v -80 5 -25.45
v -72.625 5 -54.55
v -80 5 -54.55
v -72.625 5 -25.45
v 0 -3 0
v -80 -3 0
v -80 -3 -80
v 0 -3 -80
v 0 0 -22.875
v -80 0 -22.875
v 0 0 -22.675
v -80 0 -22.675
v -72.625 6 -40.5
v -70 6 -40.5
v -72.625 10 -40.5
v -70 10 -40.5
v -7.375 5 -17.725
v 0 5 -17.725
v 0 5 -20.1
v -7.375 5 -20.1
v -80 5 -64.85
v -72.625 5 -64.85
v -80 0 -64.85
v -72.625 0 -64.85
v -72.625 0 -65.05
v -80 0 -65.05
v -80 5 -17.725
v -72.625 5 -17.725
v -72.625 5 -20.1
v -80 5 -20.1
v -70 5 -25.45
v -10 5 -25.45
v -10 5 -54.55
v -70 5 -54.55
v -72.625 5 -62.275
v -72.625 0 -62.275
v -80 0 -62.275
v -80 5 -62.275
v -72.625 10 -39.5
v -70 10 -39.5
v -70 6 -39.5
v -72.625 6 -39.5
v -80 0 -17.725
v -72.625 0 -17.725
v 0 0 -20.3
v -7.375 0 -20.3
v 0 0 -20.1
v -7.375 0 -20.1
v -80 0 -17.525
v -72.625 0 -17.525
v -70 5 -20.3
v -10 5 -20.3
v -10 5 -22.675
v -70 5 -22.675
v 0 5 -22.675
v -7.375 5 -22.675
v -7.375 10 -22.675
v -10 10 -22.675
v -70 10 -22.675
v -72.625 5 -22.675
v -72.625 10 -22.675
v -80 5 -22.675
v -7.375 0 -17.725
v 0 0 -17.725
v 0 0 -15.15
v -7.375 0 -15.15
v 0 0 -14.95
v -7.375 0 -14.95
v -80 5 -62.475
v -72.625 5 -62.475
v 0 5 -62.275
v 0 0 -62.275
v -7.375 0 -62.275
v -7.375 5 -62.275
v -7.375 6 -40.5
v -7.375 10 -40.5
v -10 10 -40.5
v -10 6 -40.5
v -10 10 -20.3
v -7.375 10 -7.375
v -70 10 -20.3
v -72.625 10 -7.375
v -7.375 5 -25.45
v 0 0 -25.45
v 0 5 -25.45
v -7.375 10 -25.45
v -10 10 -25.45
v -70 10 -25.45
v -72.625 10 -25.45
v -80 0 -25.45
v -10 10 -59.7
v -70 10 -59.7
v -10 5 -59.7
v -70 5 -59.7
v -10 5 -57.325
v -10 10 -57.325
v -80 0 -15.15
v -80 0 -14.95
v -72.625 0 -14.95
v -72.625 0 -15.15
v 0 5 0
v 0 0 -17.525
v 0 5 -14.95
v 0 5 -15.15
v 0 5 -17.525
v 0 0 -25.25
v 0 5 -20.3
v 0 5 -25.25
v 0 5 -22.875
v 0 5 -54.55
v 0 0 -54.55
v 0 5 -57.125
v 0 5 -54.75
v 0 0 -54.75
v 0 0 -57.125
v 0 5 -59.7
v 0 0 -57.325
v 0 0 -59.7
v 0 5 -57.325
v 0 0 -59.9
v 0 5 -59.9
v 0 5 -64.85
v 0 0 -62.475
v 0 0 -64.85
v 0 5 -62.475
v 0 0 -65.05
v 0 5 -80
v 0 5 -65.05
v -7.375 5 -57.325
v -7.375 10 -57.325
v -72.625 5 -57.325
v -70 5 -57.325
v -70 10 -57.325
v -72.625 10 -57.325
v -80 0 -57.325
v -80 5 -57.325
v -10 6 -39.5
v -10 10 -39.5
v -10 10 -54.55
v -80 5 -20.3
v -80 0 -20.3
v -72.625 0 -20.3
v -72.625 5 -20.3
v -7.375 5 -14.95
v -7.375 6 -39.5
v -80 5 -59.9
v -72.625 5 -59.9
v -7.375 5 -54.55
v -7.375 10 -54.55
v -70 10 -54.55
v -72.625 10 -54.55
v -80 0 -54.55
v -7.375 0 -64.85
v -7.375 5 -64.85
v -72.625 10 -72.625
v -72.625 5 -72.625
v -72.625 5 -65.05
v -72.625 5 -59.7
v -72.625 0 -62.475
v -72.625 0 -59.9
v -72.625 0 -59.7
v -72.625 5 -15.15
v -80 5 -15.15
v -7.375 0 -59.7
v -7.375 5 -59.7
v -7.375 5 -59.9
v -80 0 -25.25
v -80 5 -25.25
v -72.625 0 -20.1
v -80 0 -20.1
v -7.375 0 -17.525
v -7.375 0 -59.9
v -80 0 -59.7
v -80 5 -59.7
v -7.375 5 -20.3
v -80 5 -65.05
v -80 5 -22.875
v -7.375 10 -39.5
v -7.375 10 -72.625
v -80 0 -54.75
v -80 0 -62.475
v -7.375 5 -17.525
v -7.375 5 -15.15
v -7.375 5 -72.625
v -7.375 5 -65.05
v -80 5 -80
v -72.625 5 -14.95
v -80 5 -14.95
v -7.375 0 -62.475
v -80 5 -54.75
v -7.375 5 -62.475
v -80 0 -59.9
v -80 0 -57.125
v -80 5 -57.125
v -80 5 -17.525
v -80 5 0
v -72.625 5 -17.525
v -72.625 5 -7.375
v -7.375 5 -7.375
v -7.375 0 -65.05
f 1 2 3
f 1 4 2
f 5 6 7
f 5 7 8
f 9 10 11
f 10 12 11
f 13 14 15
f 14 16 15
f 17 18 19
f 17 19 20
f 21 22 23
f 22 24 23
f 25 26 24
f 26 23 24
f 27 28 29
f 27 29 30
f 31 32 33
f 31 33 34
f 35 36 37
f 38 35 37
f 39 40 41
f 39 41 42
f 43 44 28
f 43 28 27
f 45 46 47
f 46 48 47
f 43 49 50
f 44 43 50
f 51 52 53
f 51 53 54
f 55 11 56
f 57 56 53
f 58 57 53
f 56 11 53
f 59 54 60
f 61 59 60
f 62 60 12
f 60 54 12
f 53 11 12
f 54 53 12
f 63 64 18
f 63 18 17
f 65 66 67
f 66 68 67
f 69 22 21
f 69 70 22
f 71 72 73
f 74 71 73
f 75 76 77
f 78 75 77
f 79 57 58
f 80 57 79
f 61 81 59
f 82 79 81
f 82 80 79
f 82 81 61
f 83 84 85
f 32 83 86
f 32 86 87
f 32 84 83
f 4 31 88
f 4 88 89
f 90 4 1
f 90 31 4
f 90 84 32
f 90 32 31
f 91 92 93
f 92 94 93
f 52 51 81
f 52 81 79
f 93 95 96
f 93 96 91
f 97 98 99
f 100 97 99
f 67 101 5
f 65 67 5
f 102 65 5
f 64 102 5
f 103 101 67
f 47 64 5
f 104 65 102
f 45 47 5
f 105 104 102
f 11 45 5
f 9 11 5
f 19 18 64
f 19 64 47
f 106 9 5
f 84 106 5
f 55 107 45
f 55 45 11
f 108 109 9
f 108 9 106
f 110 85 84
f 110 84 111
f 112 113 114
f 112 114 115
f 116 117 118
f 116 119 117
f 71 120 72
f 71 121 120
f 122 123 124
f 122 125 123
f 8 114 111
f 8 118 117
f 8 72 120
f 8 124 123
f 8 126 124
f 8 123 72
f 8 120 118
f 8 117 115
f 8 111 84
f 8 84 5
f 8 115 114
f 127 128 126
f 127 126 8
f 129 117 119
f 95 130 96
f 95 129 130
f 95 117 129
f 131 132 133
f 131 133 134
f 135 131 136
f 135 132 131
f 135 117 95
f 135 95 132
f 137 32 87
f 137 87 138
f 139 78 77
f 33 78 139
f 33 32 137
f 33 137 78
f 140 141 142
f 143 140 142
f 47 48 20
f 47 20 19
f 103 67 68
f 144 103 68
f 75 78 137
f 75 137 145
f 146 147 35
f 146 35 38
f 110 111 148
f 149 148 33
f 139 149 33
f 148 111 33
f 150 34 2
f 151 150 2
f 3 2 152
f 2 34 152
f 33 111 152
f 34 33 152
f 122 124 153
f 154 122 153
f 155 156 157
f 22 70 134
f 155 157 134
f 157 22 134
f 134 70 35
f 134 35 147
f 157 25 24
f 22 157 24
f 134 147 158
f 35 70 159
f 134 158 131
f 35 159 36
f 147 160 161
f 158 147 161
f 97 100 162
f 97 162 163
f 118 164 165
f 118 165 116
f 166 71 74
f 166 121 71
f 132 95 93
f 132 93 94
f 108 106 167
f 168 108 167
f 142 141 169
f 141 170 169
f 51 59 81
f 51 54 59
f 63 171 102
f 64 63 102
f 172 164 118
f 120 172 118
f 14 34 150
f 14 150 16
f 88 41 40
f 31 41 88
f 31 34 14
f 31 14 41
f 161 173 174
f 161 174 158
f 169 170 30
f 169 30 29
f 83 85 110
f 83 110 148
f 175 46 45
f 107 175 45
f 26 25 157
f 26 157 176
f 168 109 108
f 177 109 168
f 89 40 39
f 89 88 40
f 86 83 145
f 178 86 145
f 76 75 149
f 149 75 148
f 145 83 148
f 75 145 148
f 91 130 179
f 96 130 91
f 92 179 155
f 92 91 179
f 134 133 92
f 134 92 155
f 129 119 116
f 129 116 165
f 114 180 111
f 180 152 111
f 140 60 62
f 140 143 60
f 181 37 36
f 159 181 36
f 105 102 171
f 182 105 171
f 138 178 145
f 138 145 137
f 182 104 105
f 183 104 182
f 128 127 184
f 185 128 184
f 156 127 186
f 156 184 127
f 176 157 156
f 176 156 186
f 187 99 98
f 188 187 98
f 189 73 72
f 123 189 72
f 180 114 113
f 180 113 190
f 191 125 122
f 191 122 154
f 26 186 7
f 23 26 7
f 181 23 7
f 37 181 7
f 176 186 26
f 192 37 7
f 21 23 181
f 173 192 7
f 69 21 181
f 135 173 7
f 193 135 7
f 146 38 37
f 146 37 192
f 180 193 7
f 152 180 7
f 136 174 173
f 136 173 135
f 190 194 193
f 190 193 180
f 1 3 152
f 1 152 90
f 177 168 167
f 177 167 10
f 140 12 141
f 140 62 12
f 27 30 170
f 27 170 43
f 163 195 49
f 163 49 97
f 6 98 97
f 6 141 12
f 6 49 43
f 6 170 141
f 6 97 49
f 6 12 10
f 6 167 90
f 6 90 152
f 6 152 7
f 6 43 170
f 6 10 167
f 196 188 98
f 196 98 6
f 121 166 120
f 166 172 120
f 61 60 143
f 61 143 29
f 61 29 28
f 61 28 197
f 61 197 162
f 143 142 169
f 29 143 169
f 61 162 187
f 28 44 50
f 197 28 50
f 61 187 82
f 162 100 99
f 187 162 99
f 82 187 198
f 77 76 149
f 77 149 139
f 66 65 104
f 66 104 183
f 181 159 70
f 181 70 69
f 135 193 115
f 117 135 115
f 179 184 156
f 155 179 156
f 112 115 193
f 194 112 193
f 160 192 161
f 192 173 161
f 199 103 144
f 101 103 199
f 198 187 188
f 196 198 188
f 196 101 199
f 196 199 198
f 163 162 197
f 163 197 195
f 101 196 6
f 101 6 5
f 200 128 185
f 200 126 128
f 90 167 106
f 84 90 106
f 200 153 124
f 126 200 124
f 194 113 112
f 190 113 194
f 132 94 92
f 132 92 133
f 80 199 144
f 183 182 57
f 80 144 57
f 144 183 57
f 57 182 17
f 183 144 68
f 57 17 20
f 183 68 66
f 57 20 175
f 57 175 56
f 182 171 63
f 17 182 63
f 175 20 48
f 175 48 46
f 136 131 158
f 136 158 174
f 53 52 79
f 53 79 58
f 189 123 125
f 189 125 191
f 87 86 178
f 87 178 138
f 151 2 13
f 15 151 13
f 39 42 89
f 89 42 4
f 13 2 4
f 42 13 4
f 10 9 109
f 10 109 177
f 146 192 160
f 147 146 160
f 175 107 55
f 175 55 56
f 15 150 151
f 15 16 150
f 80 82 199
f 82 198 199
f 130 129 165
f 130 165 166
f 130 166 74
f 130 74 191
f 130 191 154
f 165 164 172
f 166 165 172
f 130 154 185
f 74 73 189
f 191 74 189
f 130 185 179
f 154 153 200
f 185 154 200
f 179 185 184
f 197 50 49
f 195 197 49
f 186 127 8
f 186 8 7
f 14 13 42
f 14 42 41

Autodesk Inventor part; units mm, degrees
ref_plane "YZ Plane" through (0, 0, 0) normal (1, 0, 0) x (0, 1, 0)
ref_plane "XZ Plane" through (0, 0, 0) normal (0, 1, 0) x (-1, 0, 0)
ref_plane "XY Plane" through (0, 0, 0) normal (0, 0, 1) x (1, 0, 0)
sketch "Boceto1" plane through (0, 0, 0) normal (0, 1, 0) x (-1, 0, 0)
  line L0 (0, 0) -> (80, 0)
  line L1 (80, 0) -> (80, -80)
  line L2 (80, -80) -> (0, -80)
  line L3 (0, -80) -> (0, 0)
  line L4 (10, -70) -> (70, -70)
  line L5 (70, -70) -> (70, -10)
  line L6 (70, -10) -> (10, -10)
  line L7 (10, -10) -> (10, -70)
  line L8 (0, -12.375) -> (80, -12.375)
  line L9 (0, -14.95) -> (80, -14.95)
  line L10 (0, -17.525) -> (80, -17.525)
  line L11 (80, -20.1) -> (0, -20.1)
  line L12 (0, -22.675) -> (80, -22.675)
  line L13 (0, -12.575) -> (80, -12.575)
  line L14 (0, -15.15) -> (80, -15.15)
  line L15 (0, -17.725) -> (80, -17.725)
  line L16 (80, -20.3) -> (0, -20.3)
  line L17 (0, -22.875) -> (80, -22.875)
  line L18 (0, -25.25) -> (80, -25.25)
  line L19 (0, -25.45) -> (80, -25.45)
  line L20 (10, -40) -> (80, -40)
  line L21 (0, -67.625) -> (80, -67.625)
  line L22 (0, -65.05) -> (80, -65.05)
  line L23 (0, -62.475) -> (80, -62.475)
  line L24 (80, -59.9) -> (0, -59.9)
  line L25 (0, -57.325) -> (80, -57.325)
  line L26 (0, -67.425) -> (80, -67.425)
  line L27 (0, -64.85) -> (80, -64.85)
  line L28 (0, -62.275) -> (80, -62.275)
  line L29 (80, -59.7) -> (0, -59.7)
  line L30 (0, -57.125) -> (80, -57.125)
  line L31 (0, -54.75) -> (80, -54.75)
  line L32 (0, -54.55) -> (80, -54.55)
  line L33 (72.625, -7.375) -> (7.375, -7.375)
  line L34 (7.375, -7.375) -> (7.375, -72.625)
  line L35 (7.375, -72.625) -> (72.625, -72.625)
  line L36 (72.625, -72.625) -> (72.625, -7.375)
  line L37 (7.375, 0) -> (0, 0)
  line L38 (7.375, -80) -> (0, -80)
  point P0 (10, -12.375)
  point P1 (70, -12.375)
  point P2 (10, -14.95)
  point P3 (70, -14.95)
  point P4 (10, -17.525)
  point P5 (70, -17.525)
  point P6 (70, -20.1)
  point P7 (10, -20.1)
  point P8 (10, -22.675)
  point P9 (70, -22.675)
  point P10 (10, -12.575)
  point P11 (70, -12.575)
  point P12 (10, -15.15)
  point P13 (70, -15.15)
  point P14 (10, -17.725)
  point P15 (70, -17.725)
  point P16 (70, -20.3)
  point P17 (10, -20.3)
  point P18 (10, -22.875)
  point P19 (70, -22.875)
  point P20 (10, -25.25)
  point P21 (70, -25.25)
  point P22 (10, -25.45)
  point P23 (70, -25.45)
  point P24 (10, -67.625)
  point P25 (70, -67.625)
  point P26 (10, -65.05)
  point P27 (70, -65.05)
  point P28 (10, -62.475)
  point P29 (70, -62.475)
  point P30 (70, -59.9)
  point P31 (10, -59.9)
  point P32 (10, -57.325)
  point P33 (70, -57.325)
  point P34 (10, -67.425)
  point P35 (70, -67.425)
  point P36 (10, -64.85)
  point P37 (70, -64.85)
  point P38 (10, -62.275)
  point P39 (70, -62.275)
  point P40 (70, -59.7)
  point P41 (10, -59.7)
  point P42 (10, -57.125)
  point P43 (70, -57.125)
  point P44 (10, -54.75)
  point P45 (70, -54.75)
  point P46 (10, -54.55)
  point P47 (70, -54.55)
  point P48 (72.625, -12.375)
  point P49 (7.375, -12.375)
  point P50 (72.625, -54.55)
  point P51 (72.625, -25.45)
  point P52 (70, -25.45)
  point P53 (70, -54.55)
  point P54 (7.375, -25.45)
  point P55 (7.375, -54.55)
  point P56 (10, -54.55)
  point P57 (10, -25.45)
  point P58 (10, -67.625)
  point P59 (7.375, -67.625)
  point P60 (72.625, -67.625)
  point P61 (70, -67.625)
  point P62 (7.375, -14.95)
  point P63 (72.625, -14.95)
  point P64 (72.625, -65.05)
  point P65 (70, -65.05)
  point P66 (10, -65.05)
  point P67 (7.375, -65.05)
  point P68 (70, -67.425)
  point P69 (10, -67.425)
  point P70 (10, -12.575)
  point P71 (70, -12.575)
  point P72 (72.625, -64.85)
  point P73 (7.375, -64.85)
  point P74 (7.375, -15.15)
  point P75 (70, -15.15)
  point P76 (7.375, -62.475)
  point P77 (10, -64.85)
  point P78 (10, -62.475)
  point P79 (72.625, -62.475)
  point P80 (70, -62.475)
  point P81 (70, -64.85)
  point P82 (7.375, -17.525)
  point P83 (10, -15.15)
  point P84 (72.625, -17.525)
  point P85 (72.625, -20.1)
  point P86 (7.375, -20.1)
  point P87 (72.625, -59.9)
  point P88 (70, -59.9)
  point P89 (70, -62.275)
  point P90 (10, -62.275)
  point P91 (10, -59.9)
  point P92 (7.375, -59.9)
  point P93 (10, -17.725)
  point P94 (70, -17.725)
  point P95 (72.625, -57.325)
  point P96 (70, -57.325)
  point P97 (70, -59.7)
  point P98 (10, -59.7)
  point P99 (10, -57.325)
  point P100 (7.375, -57.325)
  point P101 (7.375, -22.675)
  point P102 (10, -20.3)
  point P103 (70, -20.3)
  point P104 (72.625, -22.675)
  dimension "d5" = 10
  dimension "d0" = 80
  dimension "d1" = 80
  dimension "d2" = 60
  dimension "d3" = 60
  dimension "d4" = 10
  dimension "d6" = 2.375
  dimension "d7" = 0.2
  dimension "d8" = 2.375
  dimension "d9" = 0.2
  dimension "d10" = 0.2
  dimension "d11" = 0.2
  dimension "d12" = 0.2
  dimension "d13" = 2.375
  dimension "d14" = 2.375
  dimension "d15" = 2.375
  dimension "d16" = 2.375
  dimension "d17" = 0.2
  dimension "d35" = 5
extrude "Extrusión1" add sketch "Boceto1" along normal blind 5 contours L0 L1 L8 L36 L33 L34 L3 | L8 L34 L13 L3 | L13 L34 L9 L3 | L34 L33 L36 L8 L5 L6 L7 | L8 L7 L13 L34 | L1 L13 L36 L8 | L13 L7 L9 L34 | L8 L5 L13 L7 | L7 L6 L5 L8 | L1 L9 L36 L13 | L36 L13 L5 L8 | L14 L34 L10 L3 | L13 L5 L9 L7 | L36 L9 L5 L13 | L14 L7 L10 L34 | L1 L10 L36 L14 | L15 L34 L11 L3 | L14 L5 L10 L7 | L36 L10 L5 L14 | L15 L7 L11 L34 | L1 L11 L36 L15 | L16 L34 L12 L3 | L15 L5 L11 L7 | L36 L11 L5 L15 | L16 L7 L12 L34 | L1 L12 L36 L16 | L17 L34 L18 L3 | L16 L5 L12 L7 | L36 L12 L5 L16 | L17 L7 L18 L34 | L1 L18 L36 L17 | L19 L34 L32 L3 | L17 L5 L18 L7 | L36 L18 L5 L17 | L19 L7 L32 L34 | L1 L20 L36 L19 | L31 L34 L30 L3 | L19 L5 L20 L7 | L1 L32 L36 L20 | L36 L20 L5 L19 | L31 L7 L30 L34 | L7 L20 L5 L32 | L36 L32 L5 L20 | L25 L34 L29 L3 | L31 L5 L30 L7 | L1 L30 L36 L31 | L25 L7 L29 L34 | L31 L36 L30 L5 | L24 L34 L28 L3 | L25 L5 L29 L7 | L1 L29 L36 L25 | L24 L7 L28 L34 | L25 L36 L29 L5 | L23 L34 L27 L3 | L24 L5 L28 L7 | L1 L28 L36 L24 | L23 L7 L27 L34 | L24 L36 L28 L5 | L22 L34 L26 L3 | L23 L5 L27 L7 | L1 L27 L36 L23 | L26 L34 L21 L3 | L22 L7 L26 L34 | L23 L36 L27 L5 | L21 L34 L35 L36 L1 L2 L3 | L26 L7 L21 L34 | L22 L5 L26 L7 | L1 L26 L36 L22 | L21 L7 L4 L5 L36 L35 L34 | L26 L5 L21 L7 | L22 L36 L26 L5 | L1 L21 L36 L26 | L21 L5 L4 L7 | L26 L36 L21 L5
sketch "Boceto2" plane through (0, 0, 0) normal (0, -1, 0) x (1, 0, 0)
  line L0 (0, -80) -> (-80, -80) projected
  line L1 (-80, 0) -> (0, 0) projected
  line L2 (-80, -80) -> (-80, 0)
  line L3 (-80, 0) -> (0, 0)
  line L4 (-80, -65.05) -> (0, -65.05) construction
  line L5 (0, 0) -> (0, -80)
  line L6 (-80, -80) -> (0, -80)
extrude "Extrusión4" add sketch "Boceto2" along normal blind 3
extrude "Extrusión5" add sketch "Boceto1" along normal blind 10 contours L34 L33 L36 L8 L5 L6 L7 | L8 L7 L13 L34 | L13 L7 L9 L34 | L8 L5 L13 L7 | L7 L6 L5 L8 | L36 L13 L5 L8 | L9 L7 L14 L34 | L13 L5 L9 L7 | L36 L9 L5 L13 | L14 L7 L10 L34 | L9 L5 L14 L7 | L36 L14 L5 L9 | L10 L7 L15 L34 | L14 L5 L10 L7 | L36 L10 L5 L14 | L15 L7 L11 L34 | L10 L5 L15 L7 | L36 L15 L5 L10 | L11 L7 L16 L34 | L15 L5 L11 L7 | L36 L11 L5 L15 | L16 L7 L12 L34 | L11 L5 L16 L7 | L36 L16 L5 L11 | L36 L12 L5 L16 | L19 L7 L32 L34 | L36 L20 L5 L19 | L36 L32 L5 L20 | L25 L7 L29 L34 | L29 L7 L24 L34 | L24 L7 L28 L34 | L29 L5 L24 L7 | L25 L36 L29 L5 | L28 L7 L23 L34 | L24 L5 L28 L7 | L29 L36 L24 L5 | L23 L7 L27 L34 | L28 L5 L23 L7 | L24 L36 L28 L5 | L27 L7 L22 L34 | L23 L5 L27 L7 | L28 L36 L23 L5 | L22 L7 L26 L34 | L27 L5 L22 L7 | L23 L36 L27 L5 | L26 L7 L21 L34 | L22 L5 L26 L7 | L27 L36 L22 L5 | L21 L7 L4 L5 L36 L35 L34 | L26 L5 L21 L7 | L22 L36 L26 L5 | L21 L5 L4 L7 | L26 L36 L21 L5
sketch "Boceto3" plane through (0, 10, 0) normal (0, 1, 0) x (1, 0, 0)
  line L0 (-7.375, 25.45) -> (-7.375, 54.55) projected
  line L1 (-7.375, 40) -> (-86.5517, 40)
  line L2 (-5, 39.5) -> (-84.1767, 39.5)
  line L3 (-5, 40.5) -> (-84.1767, 40.5)
  line L4 (-10, 54.55) -> (-10, 25.45) projected
  line L5 (-5, 40.5) -> (-5, 39.5)
  line L6 (-84.1767, 40.5) -> (-84.1767, 39.5)
  point P0 (0, 0)
  point P1 (-10, 40)
  point P2 (-10, 39.5)
  point P3 (-10, 40.5)
  point P4 (-7.375, 39.5)
  point P5 (-7.375, 40.5)
  dimension "d31" = 0.5
  dimension "d32" = 0.5
extrude "Extrusión6" cut sketch "Boceto3" against normal blind 4 contours L2 L4 L1 L0 | L1 L4 L3 L0 | L2 L6 L1 L4 | L1 L6 L3 L4
equation "\"d8\" = d6"
equation "\"d9\" = d7"
equation "\"d10\" = d9"
equation "\"d11\" = d7"
equation "\"d12\" = d7"
equation "\"d13\" = d6"
equation "\"d14\" = d6"
equation "\"d15\" = d6"
equation "\"d16\" = d6"
equation "\"d17\" = d7"
properties part number "Cortador Ancho PDMS4"
